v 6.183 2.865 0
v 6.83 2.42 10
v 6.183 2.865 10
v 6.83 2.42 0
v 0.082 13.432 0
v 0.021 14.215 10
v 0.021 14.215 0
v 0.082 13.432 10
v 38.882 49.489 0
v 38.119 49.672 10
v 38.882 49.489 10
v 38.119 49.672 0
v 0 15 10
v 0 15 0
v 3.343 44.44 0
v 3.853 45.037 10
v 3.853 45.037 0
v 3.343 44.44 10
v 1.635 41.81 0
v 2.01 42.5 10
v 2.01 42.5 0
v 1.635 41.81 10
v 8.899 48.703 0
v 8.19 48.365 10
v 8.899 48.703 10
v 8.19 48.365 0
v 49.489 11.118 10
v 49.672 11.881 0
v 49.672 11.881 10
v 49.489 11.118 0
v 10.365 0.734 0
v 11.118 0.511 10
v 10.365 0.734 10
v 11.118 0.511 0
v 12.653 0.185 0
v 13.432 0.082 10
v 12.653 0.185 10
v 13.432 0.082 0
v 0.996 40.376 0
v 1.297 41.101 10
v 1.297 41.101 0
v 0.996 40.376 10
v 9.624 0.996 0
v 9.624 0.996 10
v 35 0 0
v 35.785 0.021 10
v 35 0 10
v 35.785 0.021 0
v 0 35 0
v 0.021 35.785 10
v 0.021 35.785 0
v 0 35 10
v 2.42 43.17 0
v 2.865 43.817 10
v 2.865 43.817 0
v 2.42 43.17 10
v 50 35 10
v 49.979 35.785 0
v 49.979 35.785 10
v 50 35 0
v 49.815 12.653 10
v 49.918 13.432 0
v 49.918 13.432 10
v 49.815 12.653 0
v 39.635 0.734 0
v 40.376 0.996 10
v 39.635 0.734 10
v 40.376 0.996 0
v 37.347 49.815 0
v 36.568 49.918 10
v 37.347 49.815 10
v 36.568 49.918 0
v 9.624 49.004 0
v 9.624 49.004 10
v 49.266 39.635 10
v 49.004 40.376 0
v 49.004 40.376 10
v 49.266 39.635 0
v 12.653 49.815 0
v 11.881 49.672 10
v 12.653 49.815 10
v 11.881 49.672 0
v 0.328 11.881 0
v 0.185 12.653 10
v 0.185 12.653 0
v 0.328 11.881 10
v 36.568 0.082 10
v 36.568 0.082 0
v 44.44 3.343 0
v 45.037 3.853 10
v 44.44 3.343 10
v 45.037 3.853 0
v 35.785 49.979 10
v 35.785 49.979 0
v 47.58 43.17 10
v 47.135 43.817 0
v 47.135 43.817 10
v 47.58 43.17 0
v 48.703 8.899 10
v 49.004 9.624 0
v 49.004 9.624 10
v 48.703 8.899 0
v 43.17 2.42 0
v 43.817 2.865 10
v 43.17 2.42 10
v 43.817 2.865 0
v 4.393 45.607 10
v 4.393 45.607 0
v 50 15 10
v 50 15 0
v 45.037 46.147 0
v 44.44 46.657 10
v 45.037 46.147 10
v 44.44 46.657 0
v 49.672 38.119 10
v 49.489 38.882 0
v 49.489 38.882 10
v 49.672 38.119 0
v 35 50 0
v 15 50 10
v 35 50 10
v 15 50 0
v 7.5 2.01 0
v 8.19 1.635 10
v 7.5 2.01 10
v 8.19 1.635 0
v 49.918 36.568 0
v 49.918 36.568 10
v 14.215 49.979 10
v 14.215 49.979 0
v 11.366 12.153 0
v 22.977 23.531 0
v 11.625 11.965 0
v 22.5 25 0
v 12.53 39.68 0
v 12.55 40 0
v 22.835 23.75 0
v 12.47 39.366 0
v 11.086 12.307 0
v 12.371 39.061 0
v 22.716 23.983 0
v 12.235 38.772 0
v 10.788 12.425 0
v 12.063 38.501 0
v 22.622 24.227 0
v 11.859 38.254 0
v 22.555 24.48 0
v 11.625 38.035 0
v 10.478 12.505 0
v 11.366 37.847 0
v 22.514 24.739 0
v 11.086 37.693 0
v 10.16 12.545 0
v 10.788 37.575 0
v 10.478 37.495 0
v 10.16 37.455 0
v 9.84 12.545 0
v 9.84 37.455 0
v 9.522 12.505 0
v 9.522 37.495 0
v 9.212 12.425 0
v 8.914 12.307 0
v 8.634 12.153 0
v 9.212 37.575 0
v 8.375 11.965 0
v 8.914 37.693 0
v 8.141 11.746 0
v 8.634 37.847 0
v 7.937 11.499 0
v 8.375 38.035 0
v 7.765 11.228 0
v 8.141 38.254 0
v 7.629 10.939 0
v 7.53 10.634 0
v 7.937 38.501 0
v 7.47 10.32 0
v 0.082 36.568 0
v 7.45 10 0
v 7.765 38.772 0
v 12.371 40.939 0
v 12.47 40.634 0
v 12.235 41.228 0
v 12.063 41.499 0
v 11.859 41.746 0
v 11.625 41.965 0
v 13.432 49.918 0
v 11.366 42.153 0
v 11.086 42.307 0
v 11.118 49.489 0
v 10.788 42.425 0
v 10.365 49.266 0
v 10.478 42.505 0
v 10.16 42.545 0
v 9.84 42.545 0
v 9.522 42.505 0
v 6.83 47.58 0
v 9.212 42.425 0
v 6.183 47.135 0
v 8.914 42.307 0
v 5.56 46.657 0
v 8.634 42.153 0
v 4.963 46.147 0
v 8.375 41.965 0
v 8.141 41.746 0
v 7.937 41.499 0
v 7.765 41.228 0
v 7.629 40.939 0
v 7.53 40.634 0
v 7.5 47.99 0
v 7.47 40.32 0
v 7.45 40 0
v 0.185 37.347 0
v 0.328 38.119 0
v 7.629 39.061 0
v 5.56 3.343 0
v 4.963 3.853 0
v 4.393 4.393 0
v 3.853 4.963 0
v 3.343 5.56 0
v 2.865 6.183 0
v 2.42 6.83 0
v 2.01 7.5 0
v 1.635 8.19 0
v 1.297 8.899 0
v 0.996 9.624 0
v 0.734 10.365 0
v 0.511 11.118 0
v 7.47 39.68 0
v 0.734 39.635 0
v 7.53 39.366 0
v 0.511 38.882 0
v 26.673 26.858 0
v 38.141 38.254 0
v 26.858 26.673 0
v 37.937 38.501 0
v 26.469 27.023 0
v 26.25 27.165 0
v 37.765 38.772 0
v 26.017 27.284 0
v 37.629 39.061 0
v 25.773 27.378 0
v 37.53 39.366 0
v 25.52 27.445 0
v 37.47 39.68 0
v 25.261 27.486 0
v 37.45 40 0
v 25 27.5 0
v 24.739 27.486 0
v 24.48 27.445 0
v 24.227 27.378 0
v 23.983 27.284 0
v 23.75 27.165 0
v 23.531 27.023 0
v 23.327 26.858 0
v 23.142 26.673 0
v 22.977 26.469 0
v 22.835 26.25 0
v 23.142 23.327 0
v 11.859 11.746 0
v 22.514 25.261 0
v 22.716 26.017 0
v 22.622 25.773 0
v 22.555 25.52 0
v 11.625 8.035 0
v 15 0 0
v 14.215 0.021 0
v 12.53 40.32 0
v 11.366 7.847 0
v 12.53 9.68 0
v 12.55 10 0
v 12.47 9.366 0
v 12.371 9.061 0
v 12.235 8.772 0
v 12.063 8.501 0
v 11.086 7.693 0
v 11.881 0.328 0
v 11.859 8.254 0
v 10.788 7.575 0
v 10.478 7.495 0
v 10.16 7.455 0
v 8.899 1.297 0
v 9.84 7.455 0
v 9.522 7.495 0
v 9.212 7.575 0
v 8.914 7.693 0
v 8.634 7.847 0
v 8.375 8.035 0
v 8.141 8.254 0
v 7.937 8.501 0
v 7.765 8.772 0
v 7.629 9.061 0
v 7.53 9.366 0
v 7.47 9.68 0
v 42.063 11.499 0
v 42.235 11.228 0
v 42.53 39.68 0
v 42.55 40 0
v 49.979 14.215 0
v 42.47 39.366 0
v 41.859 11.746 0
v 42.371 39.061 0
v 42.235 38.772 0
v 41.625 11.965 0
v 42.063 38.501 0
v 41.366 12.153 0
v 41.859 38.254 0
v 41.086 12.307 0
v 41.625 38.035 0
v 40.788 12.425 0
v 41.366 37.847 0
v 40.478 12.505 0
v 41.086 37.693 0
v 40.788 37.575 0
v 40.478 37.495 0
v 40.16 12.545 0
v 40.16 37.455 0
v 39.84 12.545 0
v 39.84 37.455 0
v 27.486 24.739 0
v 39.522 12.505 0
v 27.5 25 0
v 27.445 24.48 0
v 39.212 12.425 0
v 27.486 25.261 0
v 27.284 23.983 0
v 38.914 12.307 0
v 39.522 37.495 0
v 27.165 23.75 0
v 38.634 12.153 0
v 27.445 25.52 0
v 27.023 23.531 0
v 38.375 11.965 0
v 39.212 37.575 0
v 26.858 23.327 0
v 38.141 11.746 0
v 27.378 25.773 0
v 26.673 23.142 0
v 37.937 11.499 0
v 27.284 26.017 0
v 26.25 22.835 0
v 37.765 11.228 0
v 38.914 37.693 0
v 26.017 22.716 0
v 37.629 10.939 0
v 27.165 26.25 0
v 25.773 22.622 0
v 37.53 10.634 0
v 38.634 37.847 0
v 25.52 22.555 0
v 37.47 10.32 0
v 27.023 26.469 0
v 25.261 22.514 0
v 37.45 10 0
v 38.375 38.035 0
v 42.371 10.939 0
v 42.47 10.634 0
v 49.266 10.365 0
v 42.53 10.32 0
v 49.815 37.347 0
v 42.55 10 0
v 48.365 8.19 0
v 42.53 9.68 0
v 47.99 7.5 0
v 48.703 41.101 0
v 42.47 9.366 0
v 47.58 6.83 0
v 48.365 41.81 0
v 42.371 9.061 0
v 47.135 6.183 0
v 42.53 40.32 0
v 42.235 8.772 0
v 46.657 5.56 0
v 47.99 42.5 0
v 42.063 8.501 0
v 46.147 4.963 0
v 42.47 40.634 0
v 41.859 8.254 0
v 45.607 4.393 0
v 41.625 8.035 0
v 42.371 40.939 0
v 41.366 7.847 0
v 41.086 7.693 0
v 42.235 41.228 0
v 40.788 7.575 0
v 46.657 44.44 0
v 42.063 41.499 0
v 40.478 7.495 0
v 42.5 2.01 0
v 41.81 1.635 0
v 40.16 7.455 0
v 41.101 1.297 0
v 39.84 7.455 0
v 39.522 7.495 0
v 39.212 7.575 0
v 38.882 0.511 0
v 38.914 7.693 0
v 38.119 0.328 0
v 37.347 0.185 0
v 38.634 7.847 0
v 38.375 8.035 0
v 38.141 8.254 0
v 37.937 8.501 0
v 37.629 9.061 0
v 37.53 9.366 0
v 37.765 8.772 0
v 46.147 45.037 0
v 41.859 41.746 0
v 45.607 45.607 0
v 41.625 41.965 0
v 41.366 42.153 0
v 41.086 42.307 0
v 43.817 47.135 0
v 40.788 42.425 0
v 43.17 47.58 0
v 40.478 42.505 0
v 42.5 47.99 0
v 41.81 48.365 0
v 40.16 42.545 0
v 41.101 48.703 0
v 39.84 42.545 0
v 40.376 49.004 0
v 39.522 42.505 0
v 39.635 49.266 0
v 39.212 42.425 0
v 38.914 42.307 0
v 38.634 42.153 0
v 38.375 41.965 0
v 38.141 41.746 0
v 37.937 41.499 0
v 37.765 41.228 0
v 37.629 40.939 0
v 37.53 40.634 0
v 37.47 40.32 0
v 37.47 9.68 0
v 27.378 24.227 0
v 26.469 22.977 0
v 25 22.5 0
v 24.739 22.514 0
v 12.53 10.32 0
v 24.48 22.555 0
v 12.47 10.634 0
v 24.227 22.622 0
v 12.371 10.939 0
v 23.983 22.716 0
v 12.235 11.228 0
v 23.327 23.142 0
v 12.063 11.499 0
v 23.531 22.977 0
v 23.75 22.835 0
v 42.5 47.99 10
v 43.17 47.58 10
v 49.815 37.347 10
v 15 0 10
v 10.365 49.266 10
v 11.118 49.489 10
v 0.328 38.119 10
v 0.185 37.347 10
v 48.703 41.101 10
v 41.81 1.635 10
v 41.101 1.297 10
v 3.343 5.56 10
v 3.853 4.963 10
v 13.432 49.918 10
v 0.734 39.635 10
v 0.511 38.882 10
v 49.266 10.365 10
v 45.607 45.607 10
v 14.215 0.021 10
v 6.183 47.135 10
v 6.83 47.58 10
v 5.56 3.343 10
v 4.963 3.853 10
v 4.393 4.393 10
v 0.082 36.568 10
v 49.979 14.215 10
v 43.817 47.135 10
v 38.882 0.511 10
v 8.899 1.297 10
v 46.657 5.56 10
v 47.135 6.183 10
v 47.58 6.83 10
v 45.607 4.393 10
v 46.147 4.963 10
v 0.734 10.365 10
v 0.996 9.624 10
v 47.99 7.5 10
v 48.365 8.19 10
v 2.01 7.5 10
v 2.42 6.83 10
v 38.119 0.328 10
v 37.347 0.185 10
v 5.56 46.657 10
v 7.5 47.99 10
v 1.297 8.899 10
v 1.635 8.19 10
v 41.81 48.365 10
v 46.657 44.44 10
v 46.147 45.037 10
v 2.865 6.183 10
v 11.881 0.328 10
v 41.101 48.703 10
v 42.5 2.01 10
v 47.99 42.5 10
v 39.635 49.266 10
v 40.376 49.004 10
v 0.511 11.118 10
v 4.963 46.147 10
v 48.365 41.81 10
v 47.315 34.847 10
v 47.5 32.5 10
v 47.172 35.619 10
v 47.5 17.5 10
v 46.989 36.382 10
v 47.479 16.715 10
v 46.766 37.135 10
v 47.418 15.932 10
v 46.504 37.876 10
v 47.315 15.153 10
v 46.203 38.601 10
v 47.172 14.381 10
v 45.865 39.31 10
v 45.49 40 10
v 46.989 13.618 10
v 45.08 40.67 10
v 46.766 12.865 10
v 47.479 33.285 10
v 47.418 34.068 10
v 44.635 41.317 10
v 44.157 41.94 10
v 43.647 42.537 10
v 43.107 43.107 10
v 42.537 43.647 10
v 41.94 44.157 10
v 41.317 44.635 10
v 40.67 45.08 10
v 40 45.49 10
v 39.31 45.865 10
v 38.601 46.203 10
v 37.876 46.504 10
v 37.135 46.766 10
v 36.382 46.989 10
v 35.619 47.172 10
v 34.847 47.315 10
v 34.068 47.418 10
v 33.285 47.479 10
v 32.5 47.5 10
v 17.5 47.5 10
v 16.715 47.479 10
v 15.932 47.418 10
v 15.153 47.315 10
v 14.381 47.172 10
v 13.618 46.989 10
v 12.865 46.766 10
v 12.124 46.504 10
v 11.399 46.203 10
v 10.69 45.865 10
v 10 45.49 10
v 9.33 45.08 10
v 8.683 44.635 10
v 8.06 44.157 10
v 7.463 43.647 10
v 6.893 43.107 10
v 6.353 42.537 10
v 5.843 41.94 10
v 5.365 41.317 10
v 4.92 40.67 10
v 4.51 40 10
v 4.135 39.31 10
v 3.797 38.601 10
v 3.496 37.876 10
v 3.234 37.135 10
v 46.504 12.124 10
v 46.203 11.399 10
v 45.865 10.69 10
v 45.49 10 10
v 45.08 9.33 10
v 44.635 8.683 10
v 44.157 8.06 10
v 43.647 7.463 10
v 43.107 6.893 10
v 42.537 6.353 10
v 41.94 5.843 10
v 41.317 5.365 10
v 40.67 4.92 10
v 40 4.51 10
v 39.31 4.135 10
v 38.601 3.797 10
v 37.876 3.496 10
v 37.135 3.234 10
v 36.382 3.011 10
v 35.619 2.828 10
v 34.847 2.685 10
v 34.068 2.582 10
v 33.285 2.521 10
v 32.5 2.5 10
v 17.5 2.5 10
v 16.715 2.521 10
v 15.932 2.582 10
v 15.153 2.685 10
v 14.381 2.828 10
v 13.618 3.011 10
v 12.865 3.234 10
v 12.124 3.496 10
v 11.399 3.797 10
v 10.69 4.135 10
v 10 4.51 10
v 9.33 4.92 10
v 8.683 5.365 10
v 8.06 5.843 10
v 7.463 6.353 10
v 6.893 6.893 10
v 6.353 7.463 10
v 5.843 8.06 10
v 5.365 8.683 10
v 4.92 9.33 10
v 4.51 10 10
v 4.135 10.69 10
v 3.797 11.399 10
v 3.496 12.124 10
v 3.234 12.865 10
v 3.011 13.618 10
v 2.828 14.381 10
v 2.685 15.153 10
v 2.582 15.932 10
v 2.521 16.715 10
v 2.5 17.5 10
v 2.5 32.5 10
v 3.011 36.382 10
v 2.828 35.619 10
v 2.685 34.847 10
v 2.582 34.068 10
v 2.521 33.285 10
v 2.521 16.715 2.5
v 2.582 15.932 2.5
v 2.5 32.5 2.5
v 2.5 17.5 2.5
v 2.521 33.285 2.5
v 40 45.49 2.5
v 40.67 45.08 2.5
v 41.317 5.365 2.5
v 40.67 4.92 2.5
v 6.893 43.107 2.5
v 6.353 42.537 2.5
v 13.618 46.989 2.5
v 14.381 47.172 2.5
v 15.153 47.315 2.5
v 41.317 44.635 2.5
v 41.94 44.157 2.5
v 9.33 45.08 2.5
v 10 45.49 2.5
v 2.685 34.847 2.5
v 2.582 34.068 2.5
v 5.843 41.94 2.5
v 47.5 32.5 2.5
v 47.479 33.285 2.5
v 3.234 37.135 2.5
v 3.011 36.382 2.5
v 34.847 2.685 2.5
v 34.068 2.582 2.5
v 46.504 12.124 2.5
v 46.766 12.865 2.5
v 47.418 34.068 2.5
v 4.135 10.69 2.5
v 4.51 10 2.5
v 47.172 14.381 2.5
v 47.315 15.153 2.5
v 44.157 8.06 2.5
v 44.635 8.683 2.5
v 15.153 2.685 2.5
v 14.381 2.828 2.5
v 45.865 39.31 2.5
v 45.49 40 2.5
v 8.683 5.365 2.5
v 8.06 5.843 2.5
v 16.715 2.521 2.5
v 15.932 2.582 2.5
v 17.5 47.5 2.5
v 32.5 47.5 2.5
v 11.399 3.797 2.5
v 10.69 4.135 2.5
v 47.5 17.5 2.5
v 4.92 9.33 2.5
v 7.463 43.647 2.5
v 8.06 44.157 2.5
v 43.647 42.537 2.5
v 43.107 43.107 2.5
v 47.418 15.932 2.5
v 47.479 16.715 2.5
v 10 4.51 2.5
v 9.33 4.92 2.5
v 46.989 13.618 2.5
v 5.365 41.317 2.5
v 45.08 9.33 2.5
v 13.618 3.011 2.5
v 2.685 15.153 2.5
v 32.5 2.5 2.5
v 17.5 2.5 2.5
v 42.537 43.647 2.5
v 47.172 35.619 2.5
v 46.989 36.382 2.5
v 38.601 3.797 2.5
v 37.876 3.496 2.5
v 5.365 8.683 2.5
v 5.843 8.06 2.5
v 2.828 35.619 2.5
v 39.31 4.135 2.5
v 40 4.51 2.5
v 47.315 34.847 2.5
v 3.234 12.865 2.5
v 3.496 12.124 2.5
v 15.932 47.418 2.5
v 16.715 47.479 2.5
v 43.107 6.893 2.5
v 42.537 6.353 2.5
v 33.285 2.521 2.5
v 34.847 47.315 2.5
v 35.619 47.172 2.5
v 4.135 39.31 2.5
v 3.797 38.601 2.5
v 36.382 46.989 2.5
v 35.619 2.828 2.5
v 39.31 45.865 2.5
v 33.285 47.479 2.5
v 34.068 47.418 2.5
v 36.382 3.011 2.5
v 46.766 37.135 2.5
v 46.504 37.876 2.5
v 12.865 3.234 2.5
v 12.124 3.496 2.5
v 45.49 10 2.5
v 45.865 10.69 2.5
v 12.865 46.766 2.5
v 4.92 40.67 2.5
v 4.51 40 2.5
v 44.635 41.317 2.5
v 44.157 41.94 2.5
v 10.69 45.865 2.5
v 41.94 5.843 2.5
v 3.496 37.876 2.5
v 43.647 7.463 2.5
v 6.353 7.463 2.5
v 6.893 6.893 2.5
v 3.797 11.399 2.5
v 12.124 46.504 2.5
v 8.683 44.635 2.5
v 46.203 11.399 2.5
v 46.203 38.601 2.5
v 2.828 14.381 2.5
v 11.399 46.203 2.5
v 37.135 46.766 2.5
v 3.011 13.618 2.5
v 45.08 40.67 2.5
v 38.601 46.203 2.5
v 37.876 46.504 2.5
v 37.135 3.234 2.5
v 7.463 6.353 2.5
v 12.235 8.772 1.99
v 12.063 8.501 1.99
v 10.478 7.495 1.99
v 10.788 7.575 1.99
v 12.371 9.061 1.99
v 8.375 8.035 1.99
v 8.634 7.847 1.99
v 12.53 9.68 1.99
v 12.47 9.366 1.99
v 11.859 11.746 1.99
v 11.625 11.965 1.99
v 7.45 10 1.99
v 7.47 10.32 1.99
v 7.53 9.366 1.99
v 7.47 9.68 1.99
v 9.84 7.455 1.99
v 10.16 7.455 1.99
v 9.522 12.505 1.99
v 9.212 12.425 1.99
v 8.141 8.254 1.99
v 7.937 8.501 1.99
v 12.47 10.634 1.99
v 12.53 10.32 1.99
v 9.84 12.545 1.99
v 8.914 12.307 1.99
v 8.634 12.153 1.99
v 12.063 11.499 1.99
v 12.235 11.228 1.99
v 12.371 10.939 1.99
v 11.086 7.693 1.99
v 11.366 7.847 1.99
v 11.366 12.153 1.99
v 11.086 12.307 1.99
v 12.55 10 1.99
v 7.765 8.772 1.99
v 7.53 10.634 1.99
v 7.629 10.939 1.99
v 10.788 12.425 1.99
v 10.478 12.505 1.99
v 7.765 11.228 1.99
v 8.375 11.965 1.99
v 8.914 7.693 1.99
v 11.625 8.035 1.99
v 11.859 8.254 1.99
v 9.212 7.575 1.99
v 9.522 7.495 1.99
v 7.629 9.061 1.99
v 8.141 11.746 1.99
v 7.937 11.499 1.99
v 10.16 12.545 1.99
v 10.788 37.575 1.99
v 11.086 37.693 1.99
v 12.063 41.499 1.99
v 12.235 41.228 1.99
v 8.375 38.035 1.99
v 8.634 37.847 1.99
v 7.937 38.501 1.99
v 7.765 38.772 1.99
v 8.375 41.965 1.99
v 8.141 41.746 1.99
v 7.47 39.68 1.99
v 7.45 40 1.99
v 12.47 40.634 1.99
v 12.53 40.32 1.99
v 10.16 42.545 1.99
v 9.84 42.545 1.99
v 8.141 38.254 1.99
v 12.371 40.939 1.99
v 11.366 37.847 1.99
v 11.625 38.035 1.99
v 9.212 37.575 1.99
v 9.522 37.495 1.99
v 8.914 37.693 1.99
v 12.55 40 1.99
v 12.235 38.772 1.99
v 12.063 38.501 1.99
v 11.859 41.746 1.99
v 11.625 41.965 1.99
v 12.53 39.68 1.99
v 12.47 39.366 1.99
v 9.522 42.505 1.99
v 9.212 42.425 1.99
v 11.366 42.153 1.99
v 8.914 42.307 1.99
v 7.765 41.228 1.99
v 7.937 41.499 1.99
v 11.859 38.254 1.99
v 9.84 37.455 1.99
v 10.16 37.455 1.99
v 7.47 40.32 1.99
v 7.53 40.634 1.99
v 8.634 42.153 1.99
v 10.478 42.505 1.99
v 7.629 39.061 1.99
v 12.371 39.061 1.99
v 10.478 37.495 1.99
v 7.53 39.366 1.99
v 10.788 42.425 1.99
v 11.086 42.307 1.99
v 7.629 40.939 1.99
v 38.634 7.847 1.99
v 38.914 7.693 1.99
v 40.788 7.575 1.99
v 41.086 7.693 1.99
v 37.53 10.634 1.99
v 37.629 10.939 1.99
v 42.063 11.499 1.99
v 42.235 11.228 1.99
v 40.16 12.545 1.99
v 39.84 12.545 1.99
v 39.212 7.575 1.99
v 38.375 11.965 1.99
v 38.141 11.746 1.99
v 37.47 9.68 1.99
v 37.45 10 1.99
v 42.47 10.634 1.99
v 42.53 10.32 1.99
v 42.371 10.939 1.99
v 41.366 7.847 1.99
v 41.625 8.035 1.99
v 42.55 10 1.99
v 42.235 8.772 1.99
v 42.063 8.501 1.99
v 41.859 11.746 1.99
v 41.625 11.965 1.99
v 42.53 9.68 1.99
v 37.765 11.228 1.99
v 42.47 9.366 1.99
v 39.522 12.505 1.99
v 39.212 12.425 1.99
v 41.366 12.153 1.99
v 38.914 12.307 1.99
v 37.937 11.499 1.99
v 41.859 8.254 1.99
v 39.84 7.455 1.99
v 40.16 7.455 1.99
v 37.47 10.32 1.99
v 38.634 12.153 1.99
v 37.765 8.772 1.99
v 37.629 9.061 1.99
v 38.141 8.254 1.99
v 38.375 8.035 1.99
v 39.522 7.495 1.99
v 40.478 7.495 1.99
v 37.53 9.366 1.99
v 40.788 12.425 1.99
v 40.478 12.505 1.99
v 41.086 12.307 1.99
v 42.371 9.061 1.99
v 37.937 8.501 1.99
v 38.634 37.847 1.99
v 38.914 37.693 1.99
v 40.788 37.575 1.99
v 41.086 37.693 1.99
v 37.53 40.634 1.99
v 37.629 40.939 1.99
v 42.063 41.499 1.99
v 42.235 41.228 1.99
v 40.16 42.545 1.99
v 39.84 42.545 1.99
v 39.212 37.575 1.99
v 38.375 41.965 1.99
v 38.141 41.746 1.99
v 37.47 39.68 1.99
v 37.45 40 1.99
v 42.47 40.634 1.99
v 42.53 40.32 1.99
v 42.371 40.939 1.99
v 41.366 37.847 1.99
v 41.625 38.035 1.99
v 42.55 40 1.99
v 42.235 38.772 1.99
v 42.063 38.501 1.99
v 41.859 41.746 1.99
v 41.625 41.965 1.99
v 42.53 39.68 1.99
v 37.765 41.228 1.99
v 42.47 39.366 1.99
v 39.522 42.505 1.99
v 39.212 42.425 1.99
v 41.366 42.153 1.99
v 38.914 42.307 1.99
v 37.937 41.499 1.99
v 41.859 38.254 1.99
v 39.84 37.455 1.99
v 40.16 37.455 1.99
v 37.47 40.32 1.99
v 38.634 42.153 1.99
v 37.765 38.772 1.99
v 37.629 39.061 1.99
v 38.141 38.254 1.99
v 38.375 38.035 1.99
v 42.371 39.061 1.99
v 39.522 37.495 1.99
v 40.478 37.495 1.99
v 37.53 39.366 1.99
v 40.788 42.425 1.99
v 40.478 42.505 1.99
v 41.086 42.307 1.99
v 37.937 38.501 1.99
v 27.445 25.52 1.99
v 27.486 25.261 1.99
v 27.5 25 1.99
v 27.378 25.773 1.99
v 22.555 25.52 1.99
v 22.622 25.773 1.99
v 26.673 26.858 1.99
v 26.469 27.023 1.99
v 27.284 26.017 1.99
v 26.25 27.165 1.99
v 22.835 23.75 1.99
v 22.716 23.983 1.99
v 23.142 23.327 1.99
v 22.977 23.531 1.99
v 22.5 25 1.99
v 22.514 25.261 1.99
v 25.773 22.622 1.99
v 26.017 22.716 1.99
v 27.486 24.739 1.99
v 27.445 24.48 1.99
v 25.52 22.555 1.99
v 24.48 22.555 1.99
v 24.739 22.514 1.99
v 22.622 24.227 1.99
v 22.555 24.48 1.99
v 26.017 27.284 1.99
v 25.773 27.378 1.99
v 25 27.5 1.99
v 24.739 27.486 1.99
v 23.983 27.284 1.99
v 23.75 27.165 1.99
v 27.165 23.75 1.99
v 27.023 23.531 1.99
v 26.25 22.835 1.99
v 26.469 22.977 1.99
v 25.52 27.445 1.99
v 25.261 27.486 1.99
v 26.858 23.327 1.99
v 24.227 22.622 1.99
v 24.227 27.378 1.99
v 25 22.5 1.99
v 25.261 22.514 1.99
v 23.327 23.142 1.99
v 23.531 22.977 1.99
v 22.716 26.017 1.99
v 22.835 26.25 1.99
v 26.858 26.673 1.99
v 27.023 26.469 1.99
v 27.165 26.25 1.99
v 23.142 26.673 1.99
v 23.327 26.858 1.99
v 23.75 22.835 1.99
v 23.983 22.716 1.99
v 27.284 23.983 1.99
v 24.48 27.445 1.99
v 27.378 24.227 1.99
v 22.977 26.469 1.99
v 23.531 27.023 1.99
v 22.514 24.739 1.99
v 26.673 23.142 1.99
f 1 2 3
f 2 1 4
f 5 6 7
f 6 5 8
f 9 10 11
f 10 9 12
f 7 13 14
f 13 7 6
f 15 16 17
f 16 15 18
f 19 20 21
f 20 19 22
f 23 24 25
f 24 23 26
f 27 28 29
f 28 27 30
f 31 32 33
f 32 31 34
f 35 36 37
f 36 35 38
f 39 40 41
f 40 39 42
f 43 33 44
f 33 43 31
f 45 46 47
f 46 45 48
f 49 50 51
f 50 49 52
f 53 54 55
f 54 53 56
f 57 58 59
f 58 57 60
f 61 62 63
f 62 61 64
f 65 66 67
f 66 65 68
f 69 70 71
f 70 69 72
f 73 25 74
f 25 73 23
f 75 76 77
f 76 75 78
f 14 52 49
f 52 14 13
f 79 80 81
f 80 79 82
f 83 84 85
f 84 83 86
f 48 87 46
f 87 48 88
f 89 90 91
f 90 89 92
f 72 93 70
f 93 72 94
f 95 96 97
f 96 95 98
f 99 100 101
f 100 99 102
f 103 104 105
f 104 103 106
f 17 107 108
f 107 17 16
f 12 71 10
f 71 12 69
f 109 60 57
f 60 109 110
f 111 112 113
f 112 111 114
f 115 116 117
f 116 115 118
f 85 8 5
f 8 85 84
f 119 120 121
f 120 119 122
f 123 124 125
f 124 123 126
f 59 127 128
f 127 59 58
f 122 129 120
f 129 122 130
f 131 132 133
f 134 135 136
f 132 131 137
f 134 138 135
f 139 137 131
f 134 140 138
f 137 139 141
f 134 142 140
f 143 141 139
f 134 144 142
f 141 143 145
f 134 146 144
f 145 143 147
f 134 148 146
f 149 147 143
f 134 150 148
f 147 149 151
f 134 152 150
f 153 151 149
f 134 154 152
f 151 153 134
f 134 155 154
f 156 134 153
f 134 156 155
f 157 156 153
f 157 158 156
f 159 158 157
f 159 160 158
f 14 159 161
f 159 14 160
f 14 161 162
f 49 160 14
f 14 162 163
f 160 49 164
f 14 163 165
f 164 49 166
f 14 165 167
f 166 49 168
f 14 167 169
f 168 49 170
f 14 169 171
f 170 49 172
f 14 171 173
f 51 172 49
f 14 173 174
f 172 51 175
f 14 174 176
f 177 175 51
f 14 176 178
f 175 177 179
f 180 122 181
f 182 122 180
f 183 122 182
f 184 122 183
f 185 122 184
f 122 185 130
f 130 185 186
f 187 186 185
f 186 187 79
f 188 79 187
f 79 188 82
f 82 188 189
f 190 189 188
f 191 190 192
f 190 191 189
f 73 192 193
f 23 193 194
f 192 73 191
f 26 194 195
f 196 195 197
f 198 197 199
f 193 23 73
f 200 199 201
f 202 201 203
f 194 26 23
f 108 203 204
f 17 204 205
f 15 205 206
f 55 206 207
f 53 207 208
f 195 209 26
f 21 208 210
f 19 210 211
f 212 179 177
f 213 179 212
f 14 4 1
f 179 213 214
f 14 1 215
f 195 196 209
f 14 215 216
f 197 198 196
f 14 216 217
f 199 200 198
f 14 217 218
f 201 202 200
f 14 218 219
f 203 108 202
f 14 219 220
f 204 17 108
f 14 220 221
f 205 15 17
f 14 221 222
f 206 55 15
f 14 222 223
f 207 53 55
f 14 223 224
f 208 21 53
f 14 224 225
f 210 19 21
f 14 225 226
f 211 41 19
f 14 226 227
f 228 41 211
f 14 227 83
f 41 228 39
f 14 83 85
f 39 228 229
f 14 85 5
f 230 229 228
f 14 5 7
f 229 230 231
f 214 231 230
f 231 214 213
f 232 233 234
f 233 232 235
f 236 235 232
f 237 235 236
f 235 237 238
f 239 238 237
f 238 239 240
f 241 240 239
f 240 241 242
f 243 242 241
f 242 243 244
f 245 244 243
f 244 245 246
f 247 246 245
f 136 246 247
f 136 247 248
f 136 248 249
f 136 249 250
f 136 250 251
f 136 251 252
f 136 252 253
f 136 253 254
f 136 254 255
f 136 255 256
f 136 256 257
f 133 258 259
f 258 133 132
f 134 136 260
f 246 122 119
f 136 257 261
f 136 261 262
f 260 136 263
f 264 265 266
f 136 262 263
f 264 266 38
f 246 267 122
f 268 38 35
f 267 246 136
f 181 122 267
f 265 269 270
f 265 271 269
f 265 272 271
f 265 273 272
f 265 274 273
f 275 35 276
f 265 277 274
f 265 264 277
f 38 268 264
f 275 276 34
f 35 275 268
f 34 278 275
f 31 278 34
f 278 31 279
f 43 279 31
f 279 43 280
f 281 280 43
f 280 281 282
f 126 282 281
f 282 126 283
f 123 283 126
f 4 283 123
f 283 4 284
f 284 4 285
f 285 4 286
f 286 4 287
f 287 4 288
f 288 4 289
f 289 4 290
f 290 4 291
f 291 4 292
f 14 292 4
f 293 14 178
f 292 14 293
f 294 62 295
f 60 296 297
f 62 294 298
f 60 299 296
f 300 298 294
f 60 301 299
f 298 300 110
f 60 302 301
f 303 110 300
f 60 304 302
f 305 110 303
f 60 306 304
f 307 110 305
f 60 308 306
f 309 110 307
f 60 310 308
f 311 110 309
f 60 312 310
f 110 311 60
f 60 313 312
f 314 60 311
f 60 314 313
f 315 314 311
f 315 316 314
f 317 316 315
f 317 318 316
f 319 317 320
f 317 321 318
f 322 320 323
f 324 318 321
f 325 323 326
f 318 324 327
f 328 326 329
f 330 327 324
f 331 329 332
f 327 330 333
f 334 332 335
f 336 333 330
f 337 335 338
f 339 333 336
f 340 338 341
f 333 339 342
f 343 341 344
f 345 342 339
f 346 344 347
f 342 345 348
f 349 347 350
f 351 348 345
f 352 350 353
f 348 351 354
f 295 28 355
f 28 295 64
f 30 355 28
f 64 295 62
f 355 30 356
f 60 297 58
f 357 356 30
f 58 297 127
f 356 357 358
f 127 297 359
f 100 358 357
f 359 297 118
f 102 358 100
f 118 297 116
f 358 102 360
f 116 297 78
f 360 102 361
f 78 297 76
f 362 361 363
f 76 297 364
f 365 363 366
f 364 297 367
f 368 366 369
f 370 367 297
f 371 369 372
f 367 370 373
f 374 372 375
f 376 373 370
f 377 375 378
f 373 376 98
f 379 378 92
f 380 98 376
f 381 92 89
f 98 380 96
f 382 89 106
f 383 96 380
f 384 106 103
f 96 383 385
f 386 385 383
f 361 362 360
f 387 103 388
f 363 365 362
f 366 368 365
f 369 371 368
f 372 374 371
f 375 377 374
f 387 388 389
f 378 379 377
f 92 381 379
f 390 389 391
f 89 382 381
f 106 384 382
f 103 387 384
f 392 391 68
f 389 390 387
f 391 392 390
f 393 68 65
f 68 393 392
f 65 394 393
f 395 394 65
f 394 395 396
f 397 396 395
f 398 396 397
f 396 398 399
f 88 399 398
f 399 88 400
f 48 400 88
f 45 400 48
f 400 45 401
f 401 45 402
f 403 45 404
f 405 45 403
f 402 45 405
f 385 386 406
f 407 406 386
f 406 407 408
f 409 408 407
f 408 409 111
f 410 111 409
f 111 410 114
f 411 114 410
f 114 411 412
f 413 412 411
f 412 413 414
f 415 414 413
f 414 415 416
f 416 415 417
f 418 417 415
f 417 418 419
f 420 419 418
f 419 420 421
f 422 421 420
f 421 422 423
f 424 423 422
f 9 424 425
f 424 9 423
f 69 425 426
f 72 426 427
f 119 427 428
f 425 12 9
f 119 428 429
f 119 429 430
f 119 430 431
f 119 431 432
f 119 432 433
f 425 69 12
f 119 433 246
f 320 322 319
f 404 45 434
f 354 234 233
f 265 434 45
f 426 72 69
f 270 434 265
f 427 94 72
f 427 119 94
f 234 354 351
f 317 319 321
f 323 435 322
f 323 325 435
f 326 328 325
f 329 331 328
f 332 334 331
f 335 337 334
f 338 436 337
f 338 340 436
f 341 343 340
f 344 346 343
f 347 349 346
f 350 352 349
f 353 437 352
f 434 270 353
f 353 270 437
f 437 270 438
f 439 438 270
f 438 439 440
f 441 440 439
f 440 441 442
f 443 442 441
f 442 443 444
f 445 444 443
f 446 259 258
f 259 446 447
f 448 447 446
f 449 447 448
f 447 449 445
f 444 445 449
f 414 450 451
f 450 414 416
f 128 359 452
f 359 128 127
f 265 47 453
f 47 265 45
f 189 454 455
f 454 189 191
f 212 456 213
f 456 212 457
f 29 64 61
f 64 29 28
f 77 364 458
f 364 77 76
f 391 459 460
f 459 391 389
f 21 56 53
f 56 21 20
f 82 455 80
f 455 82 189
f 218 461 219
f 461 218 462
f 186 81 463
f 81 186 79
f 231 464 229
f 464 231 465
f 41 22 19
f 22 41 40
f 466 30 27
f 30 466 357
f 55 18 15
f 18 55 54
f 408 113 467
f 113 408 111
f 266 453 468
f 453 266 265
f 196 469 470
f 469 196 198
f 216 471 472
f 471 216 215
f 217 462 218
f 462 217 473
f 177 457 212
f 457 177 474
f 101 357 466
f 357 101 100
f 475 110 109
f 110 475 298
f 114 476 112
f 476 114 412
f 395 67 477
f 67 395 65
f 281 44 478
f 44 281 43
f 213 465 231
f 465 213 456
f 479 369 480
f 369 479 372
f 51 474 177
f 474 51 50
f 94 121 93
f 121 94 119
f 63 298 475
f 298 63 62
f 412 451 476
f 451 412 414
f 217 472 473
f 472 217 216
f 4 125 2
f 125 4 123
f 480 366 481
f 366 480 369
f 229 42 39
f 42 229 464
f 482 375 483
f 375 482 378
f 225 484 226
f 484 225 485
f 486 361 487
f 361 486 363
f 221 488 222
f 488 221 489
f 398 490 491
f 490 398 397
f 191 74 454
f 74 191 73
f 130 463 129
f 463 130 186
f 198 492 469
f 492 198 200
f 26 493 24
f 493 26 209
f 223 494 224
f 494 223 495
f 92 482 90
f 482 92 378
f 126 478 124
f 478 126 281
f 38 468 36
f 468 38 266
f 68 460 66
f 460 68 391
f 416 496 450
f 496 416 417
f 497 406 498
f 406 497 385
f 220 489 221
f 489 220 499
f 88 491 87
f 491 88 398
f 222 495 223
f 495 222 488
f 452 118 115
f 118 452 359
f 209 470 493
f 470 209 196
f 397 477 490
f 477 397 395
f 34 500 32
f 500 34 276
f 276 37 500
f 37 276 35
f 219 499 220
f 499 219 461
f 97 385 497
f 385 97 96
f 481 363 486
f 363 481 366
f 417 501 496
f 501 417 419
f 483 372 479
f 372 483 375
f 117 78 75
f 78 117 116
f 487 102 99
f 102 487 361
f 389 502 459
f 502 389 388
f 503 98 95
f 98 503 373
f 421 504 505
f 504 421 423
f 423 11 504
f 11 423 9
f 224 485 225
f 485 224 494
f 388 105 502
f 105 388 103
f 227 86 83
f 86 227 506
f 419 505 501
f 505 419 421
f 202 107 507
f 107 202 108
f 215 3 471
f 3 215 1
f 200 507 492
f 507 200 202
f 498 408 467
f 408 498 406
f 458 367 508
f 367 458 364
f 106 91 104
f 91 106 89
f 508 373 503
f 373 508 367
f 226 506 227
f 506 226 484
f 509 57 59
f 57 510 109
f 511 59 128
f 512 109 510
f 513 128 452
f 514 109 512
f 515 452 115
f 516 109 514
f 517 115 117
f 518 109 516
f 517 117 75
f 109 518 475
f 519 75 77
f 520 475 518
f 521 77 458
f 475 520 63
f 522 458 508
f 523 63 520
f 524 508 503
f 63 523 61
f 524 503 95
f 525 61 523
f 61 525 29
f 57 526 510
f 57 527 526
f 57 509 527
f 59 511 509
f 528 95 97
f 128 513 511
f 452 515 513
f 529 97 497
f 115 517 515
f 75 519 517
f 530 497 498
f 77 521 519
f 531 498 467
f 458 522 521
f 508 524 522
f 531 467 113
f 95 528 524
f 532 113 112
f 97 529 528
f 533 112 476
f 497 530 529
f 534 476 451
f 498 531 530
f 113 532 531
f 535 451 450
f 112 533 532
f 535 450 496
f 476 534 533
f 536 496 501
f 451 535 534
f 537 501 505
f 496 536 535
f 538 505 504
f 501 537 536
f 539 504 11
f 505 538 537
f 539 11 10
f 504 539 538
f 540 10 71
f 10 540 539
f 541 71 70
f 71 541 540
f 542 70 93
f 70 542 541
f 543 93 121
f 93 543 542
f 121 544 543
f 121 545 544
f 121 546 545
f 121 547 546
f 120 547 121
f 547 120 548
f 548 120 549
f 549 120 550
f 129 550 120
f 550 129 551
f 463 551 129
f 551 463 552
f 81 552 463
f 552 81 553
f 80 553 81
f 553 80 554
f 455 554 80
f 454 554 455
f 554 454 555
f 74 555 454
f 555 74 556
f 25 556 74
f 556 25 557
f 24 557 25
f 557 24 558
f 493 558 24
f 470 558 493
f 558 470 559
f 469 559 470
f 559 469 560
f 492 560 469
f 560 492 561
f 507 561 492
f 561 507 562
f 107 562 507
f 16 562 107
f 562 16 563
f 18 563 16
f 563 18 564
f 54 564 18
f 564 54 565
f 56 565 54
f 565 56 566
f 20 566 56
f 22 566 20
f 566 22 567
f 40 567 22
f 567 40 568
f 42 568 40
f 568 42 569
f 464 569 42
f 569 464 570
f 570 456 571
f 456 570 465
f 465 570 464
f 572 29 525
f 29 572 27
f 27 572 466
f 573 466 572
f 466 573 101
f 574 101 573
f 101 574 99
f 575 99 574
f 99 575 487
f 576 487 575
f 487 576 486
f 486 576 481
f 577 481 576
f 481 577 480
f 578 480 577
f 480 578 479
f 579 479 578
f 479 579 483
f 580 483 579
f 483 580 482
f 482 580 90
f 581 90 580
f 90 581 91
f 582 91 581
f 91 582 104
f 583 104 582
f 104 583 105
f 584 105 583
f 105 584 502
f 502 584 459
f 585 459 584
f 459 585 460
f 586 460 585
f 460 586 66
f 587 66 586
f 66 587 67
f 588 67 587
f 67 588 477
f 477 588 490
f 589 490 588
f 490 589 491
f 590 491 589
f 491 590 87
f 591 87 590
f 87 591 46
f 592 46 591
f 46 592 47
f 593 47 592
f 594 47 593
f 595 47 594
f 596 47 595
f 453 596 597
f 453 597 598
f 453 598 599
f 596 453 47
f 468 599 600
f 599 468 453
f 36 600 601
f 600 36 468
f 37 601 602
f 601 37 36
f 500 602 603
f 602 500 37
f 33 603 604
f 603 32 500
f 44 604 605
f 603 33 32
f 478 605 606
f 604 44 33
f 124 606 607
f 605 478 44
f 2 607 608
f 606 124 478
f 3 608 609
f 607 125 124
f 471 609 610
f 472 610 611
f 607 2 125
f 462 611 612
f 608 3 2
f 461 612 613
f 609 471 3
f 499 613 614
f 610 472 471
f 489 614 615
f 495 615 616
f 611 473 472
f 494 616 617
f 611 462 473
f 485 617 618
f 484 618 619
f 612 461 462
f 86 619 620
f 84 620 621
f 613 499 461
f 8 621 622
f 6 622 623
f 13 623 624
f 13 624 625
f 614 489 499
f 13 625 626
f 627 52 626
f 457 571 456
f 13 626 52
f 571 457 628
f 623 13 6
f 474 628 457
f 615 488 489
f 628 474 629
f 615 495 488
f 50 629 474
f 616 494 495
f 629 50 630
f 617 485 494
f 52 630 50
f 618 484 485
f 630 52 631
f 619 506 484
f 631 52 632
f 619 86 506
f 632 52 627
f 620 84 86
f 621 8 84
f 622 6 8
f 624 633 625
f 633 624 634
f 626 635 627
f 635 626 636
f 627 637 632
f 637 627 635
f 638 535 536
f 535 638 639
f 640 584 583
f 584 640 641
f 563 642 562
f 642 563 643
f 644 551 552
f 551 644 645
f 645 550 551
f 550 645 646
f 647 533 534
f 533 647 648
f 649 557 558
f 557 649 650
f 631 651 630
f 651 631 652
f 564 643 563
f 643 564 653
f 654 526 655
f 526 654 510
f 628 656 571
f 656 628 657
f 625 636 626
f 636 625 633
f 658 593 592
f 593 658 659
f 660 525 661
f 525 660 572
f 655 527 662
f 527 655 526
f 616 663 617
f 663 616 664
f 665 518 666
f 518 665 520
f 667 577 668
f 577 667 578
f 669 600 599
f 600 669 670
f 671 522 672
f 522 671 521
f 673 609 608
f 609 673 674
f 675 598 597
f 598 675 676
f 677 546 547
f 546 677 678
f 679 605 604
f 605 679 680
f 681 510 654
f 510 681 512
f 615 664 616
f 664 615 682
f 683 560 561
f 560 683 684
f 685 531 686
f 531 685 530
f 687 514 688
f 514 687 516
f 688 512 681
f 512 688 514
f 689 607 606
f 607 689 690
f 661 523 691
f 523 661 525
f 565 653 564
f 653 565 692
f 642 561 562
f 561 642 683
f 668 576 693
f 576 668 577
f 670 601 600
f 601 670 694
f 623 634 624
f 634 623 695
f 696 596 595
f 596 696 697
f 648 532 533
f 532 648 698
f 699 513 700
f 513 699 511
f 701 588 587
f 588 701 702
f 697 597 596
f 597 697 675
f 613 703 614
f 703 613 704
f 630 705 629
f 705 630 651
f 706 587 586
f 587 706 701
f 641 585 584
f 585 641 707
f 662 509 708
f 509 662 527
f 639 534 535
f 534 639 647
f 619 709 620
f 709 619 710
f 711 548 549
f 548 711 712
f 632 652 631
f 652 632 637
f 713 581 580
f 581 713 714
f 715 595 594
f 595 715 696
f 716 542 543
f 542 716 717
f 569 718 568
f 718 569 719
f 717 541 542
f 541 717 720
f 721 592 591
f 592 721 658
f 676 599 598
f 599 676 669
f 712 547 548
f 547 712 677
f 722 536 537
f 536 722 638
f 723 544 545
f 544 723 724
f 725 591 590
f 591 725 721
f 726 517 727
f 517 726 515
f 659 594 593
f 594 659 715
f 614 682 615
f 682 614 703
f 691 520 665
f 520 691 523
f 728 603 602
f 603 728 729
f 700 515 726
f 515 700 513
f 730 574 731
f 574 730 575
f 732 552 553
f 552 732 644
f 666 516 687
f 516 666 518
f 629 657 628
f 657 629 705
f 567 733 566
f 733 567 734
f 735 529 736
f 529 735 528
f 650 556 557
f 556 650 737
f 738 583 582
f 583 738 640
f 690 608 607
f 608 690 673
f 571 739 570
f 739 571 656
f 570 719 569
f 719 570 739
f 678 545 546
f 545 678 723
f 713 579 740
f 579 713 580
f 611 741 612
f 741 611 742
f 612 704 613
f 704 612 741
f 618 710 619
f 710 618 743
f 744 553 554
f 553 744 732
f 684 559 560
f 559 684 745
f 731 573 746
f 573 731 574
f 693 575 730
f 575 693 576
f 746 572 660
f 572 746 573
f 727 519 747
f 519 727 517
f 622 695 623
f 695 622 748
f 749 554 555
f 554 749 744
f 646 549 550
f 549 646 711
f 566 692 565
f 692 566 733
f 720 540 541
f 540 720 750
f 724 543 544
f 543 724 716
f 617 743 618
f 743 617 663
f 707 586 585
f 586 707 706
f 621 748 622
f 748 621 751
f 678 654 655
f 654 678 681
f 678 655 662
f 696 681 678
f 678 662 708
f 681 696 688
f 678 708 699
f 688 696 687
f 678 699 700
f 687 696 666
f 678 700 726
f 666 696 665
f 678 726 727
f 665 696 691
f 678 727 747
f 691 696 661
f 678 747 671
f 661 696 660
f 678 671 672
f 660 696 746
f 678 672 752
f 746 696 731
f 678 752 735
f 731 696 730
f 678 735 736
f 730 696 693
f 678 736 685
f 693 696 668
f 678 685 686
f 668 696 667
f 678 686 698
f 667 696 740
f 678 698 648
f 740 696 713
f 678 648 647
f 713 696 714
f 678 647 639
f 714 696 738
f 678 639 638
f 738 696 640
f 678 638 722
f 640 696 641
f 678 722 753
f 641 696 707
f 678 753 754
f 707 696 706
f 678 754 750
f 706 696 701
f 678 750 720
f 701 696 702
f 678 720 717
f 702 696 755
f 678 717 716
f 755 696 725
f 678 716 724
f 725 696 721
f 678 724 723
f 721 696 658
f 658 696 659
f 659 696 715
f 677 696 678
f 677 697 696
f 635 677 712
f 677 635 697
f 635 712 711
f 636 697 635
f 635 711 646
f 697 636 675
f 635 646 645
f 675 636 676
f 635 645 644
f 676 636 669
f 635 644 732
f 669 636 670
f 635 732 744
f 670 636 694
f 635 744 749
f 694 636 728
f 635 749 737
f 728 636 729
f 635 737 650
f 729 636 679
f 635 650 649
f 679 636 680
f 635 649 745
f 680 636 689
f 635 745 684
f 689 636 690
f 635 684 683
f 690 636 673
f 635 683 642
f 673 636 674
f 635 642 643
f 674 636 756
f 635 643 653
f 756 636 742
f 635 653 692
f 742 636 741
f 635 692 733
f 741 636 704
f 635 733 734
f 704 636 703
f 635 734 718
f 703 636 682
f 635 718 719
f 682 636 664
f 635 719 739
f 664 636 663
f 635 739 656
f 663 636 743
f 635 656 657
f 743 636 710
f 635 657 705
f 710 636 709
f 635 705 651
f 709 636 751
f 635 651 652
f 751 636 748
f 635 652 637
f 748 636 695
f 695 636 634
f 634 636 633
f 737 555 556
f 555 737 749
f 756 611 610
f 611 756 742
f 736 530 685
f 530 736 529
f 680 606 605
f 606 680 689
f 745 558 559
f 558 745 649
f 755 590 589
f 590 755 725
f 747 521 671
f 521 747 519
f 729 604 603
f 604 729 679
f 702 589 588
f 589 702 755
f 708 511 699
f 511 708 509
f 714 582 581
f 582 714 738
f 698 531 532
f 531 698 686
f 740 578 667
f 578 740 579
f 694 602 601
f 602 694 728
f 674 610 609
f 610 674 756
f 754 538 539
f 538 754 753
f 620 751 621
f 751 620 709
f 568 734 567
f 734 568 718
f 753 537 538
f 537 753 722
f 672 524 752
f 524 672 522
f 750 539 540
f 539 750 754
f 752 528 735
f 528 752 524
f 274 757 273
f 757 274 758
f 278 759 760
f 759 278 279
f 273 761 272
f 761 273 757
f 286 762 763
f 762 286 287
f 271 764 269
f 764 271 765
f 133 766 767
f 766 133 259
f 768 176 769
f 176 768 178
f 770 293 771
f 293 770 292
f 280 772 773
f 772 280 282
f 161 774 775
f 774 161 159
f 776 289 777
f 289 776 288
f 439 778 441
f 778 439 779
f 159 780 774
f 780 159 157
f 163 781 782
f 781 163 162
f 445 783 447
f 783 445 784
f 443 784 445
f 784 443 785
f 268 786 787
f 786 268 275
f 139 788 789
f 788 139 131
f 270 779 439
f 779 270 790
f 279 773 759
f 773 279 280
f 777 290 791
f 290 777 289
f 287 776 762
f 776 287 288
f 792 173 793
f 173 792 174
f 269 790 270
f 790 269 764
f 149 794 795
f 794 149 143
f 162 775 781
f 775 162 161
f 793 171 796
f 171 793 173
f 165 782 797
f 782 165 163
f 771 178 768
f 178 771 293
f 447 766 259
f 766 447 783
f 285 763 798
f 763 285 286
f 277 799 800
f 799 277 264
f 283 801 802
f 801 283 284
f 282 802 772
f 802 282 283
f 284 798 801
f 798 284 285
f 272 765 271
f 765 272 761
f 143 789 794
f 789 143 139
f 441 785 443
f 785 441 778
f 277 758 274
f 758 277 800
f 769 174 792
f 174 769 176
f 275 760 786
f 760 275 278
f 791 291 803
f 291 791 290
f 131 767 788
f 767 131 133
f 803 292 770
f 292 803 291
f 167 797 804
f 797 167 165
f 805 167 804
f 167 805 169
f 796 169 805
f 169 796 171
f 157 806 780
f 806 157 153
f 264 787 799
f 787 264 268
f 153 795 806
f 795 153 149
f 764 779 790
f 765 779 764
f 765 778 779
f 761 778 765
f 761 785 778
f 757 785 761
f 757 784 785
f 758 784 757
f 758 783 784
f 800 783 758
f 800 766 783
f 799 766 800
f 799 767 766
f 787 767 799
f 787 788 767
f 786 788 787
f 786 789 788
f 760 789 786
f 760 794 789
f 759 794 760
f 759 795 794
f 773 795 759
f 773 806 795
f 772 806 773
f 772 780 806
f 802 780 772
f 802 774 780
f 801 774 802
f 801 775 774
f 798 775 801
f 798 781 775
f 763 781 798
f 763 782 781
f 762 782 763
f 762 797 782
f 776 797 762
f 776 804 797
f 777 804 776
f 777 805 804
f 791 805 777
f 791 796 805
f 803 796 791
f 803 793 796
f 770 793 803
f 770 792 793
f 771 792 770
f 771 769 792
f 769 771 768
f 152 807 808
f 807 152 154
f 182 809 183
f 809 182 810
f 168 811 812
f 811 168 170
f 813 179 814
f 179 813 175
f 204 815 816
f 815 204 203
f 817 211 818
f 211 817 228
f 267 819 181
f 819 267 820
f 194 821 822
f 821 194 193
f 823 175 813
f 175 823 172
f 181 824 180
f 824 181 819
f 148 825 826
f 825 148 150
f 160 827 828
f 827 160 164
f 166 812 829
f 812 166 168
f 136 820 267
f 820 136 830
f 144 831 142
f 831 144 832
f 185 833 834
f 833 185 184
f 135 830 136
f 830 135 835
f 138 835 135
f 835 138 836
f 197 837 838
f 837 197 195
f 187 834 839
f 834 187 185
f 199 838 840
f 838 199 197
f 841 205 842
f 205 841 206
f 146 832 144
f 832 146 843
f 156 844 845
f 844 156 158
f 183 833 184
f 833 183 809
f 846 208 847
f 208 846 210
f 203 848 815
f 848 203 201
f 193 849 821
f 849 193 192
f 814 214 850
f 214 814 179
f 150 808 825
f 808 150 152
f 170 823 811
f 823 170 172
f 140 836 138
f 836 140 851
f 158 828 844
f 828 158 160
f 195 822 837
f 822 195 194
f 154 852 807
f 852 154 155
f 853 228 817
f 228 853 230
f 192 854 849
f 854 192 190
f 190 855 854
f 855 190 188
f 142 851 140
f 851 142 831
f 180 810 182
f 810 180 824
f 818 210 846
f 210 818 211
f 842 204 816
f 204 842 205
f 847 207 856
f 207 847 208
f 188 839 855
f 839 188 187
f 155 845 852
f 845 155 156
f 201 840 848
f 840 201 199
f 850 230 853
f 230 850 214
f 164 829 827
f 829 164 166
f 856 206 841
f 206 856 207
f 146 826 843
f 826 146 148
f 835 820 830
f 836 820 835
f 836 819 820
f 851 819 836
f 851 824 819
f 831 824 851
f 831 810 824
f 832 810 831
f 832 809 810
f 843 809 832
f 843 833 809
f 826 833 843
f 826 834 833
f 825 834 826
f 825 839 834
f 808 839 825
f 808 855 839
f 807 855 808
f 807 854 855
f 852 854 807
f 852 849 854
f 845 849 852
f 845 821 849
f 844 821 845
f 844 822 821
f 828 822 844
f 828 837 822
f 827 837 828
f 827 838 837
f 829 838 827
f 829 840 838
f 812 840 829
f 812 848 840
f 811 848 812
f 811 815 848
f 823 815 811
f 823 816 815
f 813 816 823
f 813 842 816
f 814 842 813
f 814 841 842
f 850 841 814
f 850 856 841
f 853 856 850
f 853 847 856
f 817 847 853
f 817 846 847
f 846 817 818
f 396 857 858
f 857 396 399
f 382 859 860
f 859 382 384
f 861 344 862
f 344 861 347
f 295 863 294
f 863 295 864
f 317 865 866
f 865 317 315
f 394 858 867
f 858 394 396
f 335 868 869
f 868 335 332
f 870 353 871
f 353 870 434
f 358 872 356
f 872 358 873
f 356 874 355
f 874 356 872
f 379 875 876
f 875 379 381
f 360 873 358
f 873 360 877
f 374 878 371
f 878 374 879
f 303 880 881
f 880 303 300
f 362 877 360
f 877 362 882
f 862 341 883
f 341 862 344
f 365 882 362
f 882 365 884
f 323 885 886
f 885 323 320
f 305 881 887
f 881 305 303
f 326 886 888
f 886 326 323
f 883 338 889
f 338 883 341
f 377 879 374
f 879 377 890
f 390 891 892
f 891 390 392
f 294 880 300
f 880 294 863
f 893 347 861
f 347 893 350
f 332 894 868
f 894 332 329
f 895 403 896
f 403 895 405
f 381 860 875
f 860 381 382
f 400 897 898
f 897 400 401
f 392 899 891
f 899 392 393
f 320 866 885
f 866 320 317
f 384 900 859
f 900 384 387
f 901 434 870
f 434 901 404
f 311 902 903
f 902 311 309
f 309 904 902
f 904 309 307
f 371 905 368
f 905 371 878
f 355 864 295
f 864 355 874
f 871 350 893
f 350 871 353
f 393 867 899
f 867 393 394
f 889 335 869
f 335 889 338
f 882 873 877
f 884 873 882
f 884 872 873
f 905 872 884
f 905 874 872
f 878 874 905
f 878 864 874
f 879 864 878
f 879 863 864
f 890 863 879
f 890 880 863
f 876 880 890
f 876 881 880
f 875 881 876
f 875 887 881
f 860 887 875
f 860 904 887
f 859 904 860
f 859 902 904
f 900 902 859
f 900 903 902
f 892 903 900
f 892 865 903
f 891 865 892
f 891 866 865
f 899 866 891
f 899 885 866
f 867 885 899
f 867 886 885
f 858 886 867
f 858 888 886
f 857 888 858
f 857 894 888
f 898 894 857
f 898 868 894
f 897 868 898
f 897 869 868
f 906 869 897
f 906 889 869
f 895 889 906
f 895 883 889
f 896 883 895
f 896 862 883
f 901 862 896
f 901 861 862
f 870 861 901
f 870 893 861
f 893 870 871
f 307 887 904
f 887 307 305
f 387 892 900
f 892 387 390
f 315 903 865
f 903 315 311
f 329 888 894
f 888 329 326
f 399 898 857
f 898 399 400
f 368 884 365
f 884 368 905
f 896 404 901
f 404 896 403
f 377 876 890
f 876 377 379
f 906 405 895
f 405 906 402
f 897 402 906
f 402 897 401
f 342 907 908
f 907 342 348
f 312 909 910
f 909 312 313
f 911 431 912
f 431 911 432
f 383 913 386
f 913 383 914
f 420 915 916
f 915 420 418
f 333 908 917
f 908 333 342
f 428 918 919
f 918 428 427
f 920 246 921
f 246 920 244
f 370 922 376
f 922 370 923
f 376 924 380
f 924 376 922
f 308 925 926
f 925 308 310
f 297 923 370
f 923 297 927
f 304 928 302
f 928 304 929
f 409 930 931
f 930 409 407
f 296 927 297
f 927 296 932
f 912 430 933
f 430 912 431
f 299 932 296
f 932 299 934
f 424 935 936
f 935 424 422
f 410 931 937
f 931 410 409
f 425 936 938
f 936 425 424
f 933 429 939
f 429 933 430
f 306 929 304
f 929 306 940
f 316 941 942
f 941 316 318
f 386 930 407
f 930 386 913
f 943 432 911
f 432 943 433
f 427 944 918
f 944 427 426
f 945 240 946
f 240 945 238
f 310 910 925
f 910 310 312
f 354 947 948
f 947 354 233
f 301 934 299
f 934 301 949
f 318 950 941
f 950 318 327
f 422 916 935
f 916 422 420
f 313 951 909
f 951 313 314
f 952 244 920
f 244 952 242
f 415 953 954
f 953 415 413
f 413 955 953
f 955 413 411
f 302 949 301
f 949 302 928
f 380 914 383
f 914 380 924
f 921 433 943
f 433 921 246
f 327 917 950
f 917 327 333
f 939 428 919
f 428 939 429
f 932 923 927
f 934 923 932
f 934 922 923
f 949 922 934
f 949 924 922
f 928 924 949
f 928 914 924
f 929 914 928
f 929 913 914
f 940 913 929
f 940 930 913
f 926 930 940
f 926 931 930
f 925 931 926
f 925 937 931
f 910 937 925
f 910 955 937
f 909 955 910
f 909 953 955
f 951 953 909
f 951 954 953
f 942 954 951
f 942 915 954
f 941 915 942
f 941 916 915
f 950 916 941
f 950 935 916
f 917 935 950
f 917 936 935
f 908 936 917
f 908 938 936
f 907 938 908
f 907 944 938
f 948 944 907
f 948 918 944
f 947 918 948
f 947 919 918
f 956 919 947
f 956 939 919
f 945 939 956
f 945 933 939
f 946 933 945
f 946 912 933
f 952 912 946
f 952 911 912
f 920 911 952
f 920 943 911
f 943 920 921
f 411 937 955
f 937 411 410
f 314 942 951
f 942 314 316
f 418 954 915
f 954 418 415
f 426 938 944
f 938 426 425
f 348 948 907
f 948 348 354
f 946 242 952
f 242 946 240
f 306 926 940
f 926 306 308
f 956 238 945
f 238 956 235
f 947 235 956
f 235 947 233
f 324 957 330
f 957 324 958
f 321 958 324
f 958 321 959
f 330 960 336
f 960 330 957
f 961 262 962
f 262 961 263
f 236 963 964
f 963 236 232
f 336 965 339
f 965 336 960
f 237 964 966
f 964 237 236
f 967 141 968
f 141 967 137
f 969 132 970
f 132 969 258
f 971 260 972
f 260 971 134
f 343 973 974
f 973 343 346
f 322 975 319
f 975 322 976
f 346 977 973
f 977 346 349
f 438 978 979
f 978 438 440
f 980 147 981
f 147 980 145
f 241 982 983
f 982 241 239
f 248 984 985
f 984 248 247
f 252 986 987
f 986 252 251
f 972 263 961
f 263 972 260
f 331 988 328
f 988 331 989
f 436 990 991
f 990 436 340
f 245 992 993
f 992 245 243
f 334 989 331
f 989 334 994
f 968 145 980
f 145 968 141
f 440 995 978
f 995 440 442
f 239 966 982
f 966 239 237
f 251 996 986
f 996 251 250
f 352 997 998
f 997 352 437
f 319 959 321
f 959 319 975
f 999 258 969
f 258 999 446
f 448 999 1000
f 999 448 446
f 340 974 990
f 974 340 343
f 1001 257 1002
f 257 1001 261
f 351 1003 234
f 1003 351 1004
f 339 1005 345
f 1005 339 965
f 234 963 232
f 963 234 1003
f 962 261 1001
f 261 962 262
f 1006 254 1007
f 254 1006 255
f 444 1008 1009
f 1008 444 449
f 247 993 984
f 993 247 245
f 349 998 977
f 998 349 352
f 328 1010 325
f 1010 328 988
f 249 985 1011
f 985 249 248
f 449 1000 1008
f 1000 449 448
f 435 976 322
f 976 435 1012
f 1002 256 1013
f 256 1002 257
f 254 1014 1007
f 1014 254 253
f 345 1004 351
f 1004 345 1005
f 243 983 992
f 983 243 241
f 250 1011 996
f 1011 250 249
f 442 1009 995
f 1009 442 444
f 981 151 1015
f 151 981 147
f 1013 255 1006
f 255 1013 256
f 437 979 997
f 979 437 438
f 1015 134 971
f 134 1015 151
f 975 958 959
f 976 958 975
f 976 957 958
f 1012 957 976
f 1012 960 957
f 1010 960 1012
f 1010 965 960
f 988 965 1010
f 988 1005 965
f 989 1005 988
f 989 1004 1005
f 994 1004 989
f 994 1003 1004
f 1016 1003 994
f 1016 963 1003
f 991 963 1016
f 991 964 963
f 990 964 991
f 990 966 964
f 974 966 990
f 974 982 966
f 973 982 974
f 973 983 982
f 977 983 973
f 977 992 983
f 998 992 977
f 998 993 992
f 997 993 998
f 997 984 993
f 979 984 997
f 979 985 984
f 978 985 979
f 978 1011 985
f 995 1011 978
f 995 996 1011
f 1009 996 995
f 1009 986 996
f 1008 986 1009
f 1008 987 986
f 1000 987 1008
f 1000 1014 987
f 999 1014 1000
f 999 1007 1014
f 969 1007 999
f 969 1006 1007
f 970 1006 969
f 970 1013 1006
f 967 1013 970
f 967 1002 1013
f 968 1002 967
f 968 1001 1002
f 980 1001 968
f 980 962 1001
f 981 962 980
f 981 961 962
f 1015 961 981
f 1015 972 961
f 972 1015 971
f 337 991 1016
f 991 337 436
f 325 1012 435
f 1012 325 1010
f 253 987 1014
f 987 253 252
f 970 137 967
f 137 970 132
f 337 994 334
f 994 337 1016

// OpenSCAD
// file: ParametricTrays.scad
/*************************************************************************************
 *
 * Parametric tray implementation.
 *
 *************************************************************************************
 *
 * THE SOFTWARE IS PROVIDED "AS IS", WITHOUT WARRANTY OF ANY KIND, EXPRESS OR IMPLIED,
 * INCLUDING BUT NOT LIMITED TO THE WARRANTIES OF MERCHANTABILITY, FITNESS FOR A
 * PARTICULAR PURPOSE AND NONINFRINGEMENT. IN NO EVENT SHALL THE AUTHOR OR COPYRIGHT
 * HOLDER BE LIABLE FOR ANY CLAIM, DAMAGES OR OTHER LIABILITY, WHETHER IN AN ACTION
 * OF CONTRACT, TORT OR OTHERWISE, ARISING FROM, OUT OF OR IN CONNECTION WITH THE
 * SOFTWARE OR THE USE OR OTHER DEALINGS IN THE SOFTWARE.
 *
 * IT IS NOT PERMITTED TO MODIFY THIS COMMENT BLOCK.
 *
 * (c)2024, Claude "Tryphon" Theroux, Montreal, Quebec, Canada
 * http://www.ctheroux.com/
 *
 ************************************************************************************/

////////////////////////////////////////////////////////////////
// 
// Computed values. Nothing should be modified below this line.
//

module SquareTray() {
    translate([ -TrayWidth / 2, -TrayLength / 2, 0 ]) difference() {
        cube([TrayWidth, TrayLength, TrayHeight]);
        translate([TrayThickness, TrayThickness, TrayThickness]) cube([TrayWidth - 2 * TrayThickness, TrayLength - 2 * TrayThickness, TrayHeight - TrayThickness]);
    }
}

module RoundedCornerVolume(Width, Length, Height, CornerRadius) {
    $fn = 120;
    linear_extrude(height = Height) hull() {
        translate([ CornerRadius, CornerRadius, 0 ]) circle(r = CornerRadius);
        translate([ Width - CornerRadius, CornerRadius, 0 ]) circle(r = CornerRadius);
        translate([ CornerRadius, Length - CornerRadius, 0 ]) circle(r = CornerRadius);
        translate([Width - CornerRadius, Length - CornerRadius, 0]) circle(r = CornerRadius);
    }
}

module RoundedCornerSquareTray(TrayWidth, TrayLength, TrayHeight, CornerRadius) {
    difference() {
        RoundedCornerVolume(TrayWidth, TrayLength, TrayHeight, CornerRadius);
        translate([TrayThickness, TrayThickness, TrayThickness ]) RoundedCornerVolume(TrayWidth - 2 * TrayThickness, TrayLength - 2 * TrayThickness, TrayHeight - TrayThickness, CornerRadius);
    }
}

module RoundTray() {
    $fn = 120;
    difference() {
        cylinder(d = TrayDiameter, h = TrayHeight);
        translate([ 0, 0, TrayThickness ]) cylinder(d = TrayDiameter - 2 * TrayThickness, h = TrayHeight - TrayThickness);
    }
}
// main file
/* [Tray] */
// X (mm)
TrayWidth = 50;
// Y (mm)
TrayLength = 50;
// Z (mm)
TrayHeight = 10;
// Corner R (mm)
CornerRadius = 15;
// Wall Thickness (mm)
TrayThickness = 2.5;

/* [Magnet] */
// Magnet Diameter (mm)
MagnetDiameter = 5;
// Magnet Height (mm)
MagnetHeight = 2;
// Offset from edges (mm)
MagnetOffset = 10;
// Include centre magnet?
Centre="Y"; // [Y:Yes, N:No]

/* [Cover] */
// Generate Cover?
Cover="N"; // [Y:Yes, N:No]
// Cover Slop (mm)
CoverSlop = 0.1;

/* [Logo] */
// Add logo?
Logo="N"; // [Y:Yes, N:No]
// Logo SVG
LogoFile = "./_media/OBC.svg";
// Logo X
LogoX=7;
// Logo Y
LogoY=7;
// Logo Depth
LogoDepth=0.4;

// ###########################################

/* [Hidden] */
RenderCludge = 0.01; // Cludge to tidy up rendering interface
$fn=60;

// ###########################################

include <ParametricTrays.scad>;

module RoundedCornerSquareTrayWithMagnets()
{
   difference()
   {
      // Base tray
      RoundedCornerSquareTray(TrayWidth, TrayLength, TrayHeight, CornerRadius);
        
      // Add corner magnets
      for (x = [MagnetOffset, TrayWidth - MagnetOffset], y = [MagnetOffset, TrayLength - MagnetOffset])
      {
         translate([x, y, -RenderCludge]) // Slightly below zero to ensure full cut
         {
            cylinder(h = MagnetHeight, d = MagnetDiameter + 0.1, $fn=50);
         }
      }

      if( Centre == "Y" )
      {
         // Add centre magnet
         translate([TrayWidth / 2, TrayLength / 2, -RenderCludge])
         {
            cylinder(h = MagnetHeight, d = MagnetDiameter);
         }
      }
   }
}

module Cover()
{
   CoverWidth = TrayWidth + (TrayThickness * 2) + CoverSlop;
   CoverLength = TrayLength + (TrayThickness * 2) + CoverSlop;
   CoverHeight = TrayHeight + TrayThickness + (CoverSlop / 2);
   
   rotate([0, 180, 0])
       translate([-CoverWidth + (CoverSlop / 2) + TrayThickness,0 - TrayThickness - (CoverSlop / 2), -TrayHeight - TrayThickness - CoverSlop])
         RoundedCornerSquareTray(CoverWidth, CoverLength, CoverHeight, CornerRadius);

}

if( Cover == "Y" )
{
   difference()
   {
      Cover();
      if (Logo == "Y")
      {
         translate([LogoX,LogoY,TrayHeight + CoverSlop - RenderCludge])
            linear_extrude(height = 4)
               import(LogoFile);
      }
   }
}
else
{
   difference()
   {
      RoundedCornerSquareTrayWithMagnets();
      if (Logo == "Y")
      {
         translate([LogoX,LogoY,TrayThickness - LogoDepth])
            linear_extrude(height = 4)
               import(LogoFile);
      }
   }
}
